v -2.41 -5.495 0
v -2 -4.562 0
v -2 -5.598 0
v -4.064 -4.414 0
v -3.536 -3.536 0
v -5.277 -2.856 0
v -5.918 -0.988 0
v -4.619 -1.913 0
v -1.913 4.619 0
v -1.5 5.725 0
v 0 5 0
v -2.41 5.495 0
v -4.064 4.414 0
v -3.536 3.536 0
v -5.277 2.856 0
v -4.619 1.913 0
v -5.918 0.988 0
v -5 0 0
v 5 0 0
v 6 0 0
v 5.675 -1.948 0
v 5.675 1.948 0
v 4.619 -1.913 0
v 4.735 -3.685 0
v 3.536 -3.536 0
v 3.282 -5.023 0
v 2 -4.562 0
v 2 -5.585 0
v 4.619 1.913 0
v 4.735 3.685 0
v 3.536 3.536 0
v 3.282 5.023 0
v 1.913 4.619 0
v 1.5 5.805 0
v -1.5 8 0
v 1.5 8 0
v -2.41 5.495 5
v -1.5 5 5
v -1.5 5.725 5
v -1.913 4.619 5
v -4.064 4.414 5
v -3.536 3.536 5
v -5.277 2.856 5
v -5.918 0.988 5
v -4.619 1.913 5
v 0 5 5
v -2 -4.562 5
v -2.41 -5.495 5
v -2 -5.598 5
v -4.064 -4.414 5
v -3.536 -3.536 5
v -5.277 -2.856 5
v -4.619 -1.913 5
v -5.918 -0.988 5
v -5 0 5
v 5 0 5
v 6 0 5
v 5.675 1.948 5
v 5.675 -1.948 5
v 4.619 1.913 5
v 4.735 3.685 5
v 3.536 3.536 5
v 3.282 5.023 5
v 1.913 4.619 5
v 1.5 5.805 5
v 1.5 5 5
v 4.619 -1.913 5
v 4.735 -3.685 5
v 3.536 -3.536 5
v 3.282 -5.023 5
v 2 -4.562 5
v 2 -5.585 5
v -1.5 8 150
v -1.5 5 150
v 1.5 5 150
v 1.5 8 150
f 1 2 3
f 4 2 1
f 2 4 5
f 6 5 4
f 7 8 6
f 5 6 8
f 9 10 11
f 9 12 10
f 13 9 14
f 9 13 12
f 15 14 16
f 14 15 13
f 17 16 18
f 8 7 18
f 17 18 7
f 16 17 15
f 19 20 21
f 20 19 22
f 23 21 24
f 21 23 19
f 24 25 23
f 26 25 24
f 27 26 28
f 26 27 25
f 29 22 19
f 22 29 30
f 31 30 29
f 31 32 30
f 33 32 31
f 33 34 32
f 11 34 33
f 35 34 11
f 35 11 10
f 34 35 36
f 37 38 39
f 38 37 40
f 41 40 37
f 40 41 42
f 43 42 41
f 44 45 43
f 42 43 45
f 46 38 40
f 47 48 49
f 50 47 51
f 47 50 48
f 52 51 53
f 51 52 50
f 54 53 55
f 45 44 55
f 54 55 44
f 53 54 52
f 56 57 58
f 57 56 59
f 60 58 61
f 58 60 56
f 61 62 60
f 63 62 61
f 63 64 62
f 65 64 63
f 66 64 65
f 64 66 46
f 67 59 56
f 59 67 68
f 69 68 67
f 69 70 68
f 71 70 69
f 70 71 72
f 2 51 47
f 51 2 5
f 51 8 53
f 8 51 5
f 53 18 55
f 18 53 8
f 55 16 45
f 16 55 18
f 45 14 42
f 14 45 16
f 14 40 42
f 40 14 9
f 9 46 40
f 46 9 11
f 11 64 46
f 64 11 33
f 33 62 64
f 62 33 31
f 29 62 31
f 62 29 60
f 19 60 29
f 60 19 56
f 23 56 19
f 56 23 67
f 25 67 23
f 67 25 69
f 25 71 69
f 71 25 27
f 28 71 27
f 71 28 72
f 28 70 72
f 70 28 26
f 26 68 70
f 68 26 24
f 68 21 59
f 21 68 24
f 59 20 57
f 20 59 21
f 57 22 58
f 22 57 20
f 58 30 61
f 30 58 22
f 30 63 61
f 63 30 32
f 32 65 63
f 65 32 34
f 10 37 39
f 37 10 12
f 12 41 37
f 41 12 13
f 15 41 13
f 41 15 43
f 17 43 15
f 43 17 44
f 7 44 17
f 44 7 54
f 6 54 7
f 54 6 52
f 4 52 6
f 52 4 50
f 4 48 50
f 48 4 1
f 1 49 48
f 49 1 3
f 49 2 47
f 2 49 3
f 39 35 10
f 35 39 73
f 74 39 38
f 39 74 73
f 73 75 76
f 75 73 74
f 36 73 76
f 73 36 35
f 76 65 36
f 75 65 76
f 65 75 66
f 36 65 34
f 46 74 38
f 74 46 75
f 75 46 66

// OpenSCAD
//!OpenSCAD

stick_length = 150;
Grabber_length = 5;
stick_side_length = 3;
grabber_diameter = 10;
Opening_diameter = 4;
plastk_thickness = 2;
union(){
  linear_extrude( height=Grabber_length, twist=0, scale=[1, 1], center=false){
    difference() {
      circle(r=((grabber_diameter + plastk_thickness) / 2));

      circle(r=(grabber_diameter / 2));
      translate([(Opening_diameter / -2), -1000, 0]){
        square([Opening_diameter, 1000], center=false);
      }
    }
  }
  linear_extrude( height=stick_length, twist=0, scale=[1, 1], center=false){
    translate([0, ((grabber_diameter / 2 + plastk_thickness) + (stick_side_length / 2 - plastk_thickness)), 0]){
      square([stick_side_length, stick_side_length], center=true);
    }
  }
}
